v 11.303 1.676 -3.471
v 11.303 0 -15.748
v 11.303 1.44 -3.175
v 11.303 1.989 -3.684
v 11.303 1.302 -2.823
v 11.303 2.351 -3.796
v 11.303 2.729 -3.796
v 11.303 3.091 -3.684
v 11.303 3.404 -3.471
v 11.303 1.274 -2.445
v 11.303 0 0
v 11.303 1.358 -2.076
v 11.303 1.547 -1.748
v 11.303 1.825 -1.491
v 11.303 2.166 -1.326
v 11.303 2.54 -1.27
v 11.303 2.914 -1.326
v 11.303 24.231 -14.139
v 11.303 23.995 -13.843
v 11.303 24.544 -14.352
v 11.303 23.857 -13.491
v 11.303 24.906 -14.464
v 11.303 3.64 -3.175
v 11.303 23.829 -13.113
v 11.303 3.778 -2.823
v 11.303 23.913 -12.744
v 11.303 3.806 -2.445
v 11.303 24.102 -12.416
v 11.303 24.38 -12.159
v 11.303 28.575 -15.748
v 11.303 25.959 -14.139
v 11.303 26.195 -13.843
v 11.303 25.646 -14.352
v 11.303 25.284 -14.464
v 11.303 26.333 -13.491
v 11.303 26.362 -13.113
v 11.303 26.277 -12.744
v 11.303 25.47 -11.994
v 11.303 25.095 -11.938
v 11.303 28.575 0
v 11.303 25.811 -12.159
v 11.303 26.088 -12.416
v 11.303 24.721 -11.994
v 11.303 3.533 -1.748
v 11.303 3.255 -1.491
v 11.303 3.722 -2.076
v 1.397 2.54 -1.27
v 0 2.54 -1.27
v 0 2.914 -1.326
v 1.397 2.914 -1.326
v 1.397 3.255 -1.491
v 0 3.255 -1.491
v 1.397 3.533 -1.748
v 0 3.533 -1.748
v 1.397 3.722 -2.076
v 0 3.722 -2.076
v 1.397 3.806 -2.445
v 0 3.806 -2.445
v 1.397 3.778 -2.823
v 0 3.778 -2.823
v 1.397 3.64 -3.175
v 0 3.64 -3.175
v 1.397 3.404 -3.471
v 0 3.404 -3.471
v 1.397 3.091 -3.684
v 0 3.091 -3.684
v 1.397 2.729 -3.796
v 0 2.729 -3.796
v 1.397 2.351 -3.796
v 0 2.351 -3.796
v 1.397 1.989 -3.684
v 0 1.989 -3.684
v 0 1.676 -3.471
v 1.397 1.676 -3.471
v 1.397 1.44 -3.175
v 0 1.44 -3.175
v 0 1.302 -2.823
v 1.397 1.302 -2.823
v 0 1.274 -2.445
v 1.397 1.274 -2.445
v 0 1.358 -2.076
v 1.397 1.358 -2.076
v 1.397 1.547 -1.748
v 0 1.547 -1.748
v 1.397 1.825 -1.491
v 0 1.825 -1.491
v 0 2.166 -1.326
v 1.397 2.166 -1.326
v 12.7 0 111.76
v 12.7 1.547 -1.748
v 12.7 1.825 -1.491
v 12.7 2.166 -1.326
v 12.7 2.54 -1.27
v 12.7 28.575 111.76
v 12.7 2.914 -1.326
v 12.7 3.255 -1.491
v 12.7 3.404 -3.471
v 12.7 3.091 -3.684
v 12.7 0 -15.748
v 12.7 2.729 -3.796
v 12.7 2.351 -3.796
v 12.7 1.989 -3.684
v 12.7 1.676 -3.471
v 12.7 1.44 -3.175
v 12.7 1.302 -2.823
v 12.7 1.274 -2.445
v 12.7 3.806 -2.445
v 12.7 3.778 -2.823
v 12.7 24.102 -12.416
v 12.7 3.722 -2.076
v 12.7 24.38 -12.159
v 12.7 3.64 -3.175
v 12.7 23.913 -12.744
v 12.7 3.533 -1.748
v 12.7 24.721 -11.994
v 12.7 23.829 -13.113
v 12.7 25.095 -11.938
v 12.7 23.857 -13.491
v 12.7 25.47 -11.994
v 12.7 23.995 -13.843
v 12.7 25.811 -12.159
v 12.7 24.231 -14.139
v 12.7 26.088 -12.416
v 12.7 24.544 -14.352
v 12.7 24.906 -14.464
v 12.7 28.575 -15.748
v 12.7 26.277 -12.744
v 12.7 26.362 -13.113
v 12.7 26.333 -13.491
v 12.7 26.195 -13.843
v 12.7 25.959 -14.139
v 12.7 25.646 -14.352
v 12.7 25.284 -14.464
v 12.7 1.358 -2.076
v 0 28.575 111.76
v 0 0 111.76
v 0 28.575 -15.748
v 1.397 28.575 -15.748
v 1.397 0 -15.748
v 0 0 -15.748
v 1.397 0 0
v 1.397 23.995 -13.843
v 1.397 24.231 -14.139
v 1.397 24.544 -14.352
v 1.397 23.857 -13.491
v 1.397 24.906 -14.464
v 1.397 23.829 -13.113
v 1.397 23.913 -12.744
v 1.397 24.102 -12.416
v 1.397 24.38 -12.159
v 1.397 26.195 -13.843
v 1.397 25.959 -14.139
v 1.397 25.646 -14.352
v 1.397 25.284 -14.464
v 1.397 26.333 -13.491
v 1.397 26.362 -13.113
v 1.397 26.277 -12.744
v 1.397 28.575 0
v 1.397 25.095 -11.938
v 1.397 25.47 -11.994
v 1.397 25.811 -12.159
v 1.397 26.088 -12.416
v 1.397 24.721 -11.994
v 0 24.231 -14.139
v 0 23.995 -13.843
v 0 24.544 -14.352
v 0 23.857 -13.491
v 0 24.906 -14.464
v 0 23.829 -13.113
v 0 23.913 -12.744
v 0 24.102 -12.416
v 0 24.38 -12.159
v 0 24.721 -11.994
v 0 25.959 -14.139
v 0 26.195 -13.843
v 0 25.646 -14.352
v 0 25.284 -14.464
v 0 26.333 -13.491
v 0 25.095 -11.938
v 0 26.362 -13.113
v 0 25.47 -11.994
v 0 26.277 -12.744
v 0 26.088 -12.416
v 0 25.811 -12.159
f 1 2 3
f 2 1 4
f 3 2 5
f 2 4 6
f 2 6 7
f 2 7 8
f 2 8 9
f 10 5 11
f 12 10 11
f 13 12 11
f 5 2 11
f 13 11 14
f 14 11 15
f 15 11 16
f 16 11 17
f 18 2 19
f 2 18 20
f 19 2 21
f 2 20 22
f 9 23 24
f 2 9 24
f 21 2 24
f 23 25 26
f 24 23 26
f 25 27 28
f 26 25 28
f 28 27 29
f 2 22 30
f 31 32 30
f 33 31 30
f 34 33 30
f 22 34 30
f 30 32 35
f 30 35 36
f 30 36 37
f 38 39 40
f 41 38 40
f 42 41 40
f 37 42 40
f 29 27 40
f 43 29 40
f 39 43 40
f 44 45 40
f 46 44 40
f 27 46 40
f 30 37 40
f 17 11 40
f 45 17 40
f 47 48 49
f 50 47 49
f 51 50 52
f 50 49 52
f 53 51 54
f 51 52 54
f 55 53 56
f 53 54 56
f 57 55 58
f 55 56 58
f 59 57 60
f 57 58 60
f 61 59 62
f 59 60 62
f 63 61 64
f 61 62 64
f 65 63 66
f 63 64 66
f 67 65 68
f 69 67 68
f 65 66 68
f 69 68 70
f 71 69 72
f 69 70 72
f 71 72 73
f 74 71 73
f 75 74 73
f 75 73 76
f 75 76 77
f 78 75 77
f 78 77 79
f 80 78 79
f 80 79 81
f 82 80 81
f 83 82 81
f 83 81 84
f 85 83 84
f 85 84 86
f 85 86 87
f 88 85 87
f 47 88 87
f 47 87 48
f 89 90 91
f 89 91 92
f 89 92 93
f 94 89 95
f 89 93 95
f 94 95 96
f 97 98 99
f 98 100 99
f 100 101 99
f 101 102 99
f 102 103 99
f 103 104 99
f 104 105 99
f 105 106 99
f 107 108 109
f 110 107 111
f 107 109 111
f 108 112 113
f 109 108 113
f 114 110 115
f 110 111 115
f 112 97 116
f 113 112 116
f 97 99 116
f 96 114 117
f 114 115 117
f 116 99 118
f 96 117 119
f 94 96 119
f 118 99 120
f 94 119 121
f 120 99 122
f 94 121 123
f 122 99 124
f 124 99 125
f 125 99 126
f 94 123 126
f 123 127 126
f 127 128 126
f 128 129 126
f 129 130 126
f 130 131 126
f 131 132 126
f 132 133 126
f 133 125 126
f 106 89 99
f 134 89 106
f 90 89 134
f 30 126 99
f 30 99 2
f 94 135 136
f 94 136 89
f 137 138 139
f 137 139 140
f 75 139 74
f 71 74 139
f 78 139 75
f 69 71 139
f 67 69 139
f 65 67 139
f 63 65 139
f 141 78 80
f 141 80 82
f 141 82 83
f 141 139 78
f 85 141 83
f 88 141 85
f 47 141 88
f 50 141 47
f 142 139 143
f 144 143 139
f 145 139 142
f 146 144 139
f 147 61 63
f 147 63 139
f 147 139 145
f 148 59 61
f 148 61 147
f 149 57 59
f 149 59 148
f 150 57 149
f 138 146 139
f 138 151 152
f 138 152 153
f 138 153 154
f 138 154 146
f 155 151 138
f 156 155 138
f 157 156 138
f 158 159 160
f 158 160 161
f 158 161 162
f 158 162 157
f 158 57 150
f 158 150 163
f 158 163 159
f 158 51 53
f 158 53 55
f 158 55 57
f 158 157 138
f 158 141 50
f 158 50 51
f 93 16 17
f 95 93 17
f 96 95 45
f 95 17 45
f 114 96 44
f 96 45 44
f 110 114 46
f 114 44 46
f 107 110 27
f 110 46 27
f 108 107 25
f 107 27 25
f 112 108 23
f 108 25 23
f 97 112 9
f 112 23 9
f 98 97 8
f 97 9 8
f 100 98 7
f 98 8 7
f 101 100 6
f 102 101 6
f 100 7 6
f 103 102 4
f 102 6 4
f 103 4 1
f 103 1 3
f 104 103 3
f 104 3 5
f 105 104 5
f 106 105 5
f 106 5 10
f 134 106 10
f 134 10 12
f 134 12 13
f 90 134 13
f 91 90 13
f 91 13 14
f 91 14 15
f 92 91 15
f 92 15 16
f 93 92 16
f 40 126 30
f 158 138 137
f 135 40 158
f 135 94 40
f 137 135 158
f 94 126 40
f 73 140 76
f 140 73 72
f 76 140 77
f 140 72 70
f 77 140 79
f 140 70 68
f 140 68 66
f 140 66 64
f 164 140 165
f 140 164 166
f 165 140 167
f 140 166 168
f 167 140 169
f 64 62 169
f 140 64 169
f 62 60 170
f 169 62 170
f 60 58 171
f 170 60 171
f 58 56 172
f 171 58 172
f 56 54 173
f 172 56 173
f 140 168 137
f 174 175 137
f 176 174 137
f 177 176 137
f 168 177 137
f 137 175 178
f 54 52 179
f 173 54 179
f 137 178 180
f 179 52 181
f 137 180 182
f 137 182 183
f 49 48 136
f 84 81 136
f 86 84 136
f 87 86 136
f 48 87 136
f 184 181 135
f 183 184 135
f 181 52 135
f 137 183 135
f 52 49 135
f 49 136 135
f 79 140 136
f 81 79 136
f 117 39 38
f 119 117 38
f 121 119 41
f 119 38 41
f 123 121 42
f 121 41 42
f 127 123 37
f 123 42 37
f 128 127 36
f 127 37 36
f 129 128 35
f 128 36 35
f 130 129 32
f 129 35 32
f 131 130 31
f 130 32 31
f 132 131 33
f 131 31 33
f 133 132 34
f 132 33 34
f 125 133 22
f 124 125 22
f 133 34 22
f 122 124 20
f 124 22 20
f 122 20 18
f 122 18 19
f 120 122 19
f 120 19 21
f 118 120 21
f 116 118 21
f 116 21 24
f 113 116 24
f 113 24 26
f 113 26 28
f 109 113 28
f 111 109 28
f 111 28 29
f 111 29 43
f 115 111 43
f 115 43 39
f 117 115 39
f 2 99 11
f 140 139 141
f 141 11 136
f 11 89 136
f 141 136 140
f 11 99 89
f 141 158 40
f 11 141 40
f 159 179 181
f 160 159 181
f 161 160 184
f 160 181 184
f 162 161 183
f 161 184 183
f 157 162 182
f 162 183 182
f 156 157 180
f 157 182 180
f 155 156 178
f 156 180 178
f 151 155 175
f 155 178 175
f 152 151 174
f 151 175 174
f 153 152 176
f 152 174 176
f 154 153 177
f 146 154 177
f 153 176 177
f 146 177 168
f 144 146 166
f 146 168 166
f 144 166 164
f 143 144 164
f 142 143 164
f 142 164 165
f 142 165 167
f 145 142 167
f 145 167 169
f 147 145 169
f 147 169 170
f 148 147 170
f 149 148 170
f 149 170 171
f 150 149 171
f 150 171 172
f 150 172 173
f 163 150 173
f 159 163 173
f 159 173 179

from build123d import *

# Parameters (mm, degrees)
SKETCH1_W               = 12.7
SKETCH1_H               = 28.575
BOSS_EXTRUDE1_DEPTH     = 111.76
SKETCH3_W               = 1.397
SKETCH3_H               = 28.575
BOSS_EXTRUDE3_DEPTH     = 15.748
SKETCH7_R               = 1.27
CUT_EXTRUDE3_DEPTH      = 1
CUT_EXTRUDE3_DEPTH_BACK = 13.7


with BuildPart() as part:
    # Sketch1 → Boss-Extrude1 (new body)
    with BuildSketch(Plane.XY):
        with Locations((6.35, 14.2875)):
            Rectangle(SKETCH1_W, SKETCH1_H)
    extrude(amount=BOSS_EXTRUDE1_DEPTH)

    # Sketch3 → Boss-Extrude3 (add)
    with BuildSketch(Plane(origin=(0, 0, 0), x_dir=(-1, 0, 0), z_dir=(0, 0, -1))):
        with Locations((-0.6985, 14.2875)):
            Rectangle(SKETCH3_W, SKETCH3_H)
        with Locations((-12.0015, 14.2875)):
            Rectangle(SKETCH3_W, SKETCH3_H)
    extrude(amount=BOSS_EXTRUDE3_DEPTH)

    # Sketch7 → Cut-Extrude3 (cut, two sides)
    with BuildSketch(Plane.ZY) as cut_extrude3_sk:
        with Locations((-13.208, 25.0952)):
            Circle(SKETCH7_R)
        with Locations((-2.54, 2.54)):
            Circle(SKETCH7_R)
    extrude(amount=CUT_EXTRUDE3_DEPTH, mode=Mode.SUBTRACT)
    extrude(cut_extrude3_sk.sketch, amount=-CUT_EXTRUDE3_DEPTH_BACK, mode=Mode.SUBTRACT)


solid = part.part
